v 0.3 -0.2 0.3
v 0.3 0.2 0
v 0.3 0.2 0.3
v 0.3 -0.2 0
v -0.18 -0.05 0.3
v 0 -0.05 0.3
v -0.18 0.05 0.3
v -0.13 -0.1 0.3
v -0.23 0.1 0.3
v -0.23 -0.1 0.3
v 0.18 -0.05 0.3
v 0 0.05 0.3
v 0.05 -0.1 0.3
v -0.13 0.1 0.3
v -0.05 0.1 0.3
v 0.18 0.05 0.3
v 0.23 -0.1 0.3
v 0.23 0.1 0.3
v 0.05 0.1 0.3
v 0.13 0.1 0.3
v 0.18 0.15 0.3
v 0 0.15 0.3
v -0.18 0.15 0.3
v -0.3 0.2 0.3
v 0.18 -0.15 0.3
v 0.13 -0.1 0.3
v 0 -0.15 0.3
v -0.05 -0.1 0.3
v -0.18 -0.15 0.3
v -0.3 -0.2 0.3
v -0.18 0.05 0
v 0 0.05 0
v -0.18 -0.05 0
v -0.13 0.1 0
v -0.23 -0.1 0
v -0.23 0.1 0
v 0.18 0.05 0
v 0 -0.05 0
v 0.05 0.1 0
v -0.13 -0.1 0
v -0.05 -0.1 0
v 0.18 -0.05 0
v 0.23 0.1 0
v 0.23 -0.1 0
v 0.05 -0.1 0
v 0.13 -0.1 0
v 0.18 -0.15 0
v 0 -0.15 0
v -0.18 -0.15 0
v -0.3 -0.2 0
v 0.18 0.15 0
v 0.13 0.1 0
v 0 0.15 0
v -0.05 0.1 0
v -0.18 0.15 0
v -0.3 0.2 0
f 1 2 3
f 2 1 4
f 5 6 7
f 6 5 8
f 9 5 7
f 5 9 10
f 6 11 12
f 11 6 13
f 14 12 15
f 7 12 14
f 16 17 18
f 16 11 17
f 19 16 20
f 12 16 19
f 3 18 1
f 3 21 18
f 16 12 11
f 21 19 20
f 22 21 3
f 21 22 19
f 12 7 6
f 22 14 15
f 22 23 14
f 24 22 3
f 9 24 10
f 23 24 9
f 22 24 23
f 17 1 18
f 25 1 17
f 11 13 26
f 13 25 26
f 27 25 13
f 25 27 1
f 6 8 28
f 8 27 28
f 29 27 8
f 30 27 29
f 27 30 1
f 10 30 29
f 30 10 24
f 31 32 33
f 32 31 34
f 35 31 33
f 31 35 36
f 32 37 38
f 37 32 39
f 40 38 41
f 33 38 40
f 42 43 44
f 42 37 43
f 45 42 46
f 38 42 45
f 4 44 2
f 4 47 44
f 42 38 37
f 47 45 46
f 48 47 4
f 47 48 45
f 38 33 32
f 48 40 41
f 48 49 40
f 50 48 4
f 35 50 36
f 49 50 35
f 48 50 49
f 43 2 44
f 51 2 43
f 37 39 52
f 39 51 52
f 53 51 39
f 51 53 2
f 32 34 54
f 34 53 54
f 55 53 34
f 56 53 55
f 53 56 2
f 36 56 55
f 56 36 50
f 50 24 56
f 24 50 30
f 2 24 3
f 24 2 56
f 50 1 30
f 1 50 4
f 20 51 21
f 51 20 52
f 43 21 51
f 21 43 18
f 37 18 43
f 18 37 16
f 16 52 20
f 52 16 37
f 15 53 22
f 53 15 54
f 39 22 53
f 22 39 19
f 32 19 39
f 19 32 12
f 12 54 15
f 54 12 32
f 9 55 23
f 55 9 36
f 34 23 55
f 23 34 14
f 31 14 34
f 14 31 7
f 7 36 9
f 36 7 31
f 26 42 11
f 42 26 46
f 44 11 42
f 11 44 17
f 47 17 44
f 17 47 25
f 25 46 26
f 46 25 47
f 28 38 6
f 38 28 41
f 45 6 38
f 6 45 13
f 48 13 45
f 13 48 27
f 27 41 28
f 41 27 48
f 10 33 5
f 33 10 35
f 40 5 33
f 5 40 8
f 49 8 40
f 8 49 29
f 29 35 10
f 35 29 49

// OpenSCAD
use <lib.scad>

module body() {
	translate([0,0,0.15]) difference() {
		if ($fn > 8) rbox([0.6, 0.4, 0.3], 0.01, $fn=round($fn/8)); else box([0.6, 0.4, 0.3]);
		#translate([0.18,0.1,0]) cyl(0.05, 0.05, 1.0);
		#translate([0.0,0.1,0]) cyl(0.05, 0.05, 1.0);
		#translate([-0.18,0.1,0]) cyl(0.05, 0.05, 1.0);
		#translate([0.18,-0.1,0]) cyl(0.05, 0.05, 1.0);
		#translate([0.0,-0.1,0]) cyl(0.05, 0.05, 1.0);
		#translate([-0.18,-0.1,0]) cyl(0.05, 0.05, 1.0);
	}
}

d = 4;
body($fn=d);
